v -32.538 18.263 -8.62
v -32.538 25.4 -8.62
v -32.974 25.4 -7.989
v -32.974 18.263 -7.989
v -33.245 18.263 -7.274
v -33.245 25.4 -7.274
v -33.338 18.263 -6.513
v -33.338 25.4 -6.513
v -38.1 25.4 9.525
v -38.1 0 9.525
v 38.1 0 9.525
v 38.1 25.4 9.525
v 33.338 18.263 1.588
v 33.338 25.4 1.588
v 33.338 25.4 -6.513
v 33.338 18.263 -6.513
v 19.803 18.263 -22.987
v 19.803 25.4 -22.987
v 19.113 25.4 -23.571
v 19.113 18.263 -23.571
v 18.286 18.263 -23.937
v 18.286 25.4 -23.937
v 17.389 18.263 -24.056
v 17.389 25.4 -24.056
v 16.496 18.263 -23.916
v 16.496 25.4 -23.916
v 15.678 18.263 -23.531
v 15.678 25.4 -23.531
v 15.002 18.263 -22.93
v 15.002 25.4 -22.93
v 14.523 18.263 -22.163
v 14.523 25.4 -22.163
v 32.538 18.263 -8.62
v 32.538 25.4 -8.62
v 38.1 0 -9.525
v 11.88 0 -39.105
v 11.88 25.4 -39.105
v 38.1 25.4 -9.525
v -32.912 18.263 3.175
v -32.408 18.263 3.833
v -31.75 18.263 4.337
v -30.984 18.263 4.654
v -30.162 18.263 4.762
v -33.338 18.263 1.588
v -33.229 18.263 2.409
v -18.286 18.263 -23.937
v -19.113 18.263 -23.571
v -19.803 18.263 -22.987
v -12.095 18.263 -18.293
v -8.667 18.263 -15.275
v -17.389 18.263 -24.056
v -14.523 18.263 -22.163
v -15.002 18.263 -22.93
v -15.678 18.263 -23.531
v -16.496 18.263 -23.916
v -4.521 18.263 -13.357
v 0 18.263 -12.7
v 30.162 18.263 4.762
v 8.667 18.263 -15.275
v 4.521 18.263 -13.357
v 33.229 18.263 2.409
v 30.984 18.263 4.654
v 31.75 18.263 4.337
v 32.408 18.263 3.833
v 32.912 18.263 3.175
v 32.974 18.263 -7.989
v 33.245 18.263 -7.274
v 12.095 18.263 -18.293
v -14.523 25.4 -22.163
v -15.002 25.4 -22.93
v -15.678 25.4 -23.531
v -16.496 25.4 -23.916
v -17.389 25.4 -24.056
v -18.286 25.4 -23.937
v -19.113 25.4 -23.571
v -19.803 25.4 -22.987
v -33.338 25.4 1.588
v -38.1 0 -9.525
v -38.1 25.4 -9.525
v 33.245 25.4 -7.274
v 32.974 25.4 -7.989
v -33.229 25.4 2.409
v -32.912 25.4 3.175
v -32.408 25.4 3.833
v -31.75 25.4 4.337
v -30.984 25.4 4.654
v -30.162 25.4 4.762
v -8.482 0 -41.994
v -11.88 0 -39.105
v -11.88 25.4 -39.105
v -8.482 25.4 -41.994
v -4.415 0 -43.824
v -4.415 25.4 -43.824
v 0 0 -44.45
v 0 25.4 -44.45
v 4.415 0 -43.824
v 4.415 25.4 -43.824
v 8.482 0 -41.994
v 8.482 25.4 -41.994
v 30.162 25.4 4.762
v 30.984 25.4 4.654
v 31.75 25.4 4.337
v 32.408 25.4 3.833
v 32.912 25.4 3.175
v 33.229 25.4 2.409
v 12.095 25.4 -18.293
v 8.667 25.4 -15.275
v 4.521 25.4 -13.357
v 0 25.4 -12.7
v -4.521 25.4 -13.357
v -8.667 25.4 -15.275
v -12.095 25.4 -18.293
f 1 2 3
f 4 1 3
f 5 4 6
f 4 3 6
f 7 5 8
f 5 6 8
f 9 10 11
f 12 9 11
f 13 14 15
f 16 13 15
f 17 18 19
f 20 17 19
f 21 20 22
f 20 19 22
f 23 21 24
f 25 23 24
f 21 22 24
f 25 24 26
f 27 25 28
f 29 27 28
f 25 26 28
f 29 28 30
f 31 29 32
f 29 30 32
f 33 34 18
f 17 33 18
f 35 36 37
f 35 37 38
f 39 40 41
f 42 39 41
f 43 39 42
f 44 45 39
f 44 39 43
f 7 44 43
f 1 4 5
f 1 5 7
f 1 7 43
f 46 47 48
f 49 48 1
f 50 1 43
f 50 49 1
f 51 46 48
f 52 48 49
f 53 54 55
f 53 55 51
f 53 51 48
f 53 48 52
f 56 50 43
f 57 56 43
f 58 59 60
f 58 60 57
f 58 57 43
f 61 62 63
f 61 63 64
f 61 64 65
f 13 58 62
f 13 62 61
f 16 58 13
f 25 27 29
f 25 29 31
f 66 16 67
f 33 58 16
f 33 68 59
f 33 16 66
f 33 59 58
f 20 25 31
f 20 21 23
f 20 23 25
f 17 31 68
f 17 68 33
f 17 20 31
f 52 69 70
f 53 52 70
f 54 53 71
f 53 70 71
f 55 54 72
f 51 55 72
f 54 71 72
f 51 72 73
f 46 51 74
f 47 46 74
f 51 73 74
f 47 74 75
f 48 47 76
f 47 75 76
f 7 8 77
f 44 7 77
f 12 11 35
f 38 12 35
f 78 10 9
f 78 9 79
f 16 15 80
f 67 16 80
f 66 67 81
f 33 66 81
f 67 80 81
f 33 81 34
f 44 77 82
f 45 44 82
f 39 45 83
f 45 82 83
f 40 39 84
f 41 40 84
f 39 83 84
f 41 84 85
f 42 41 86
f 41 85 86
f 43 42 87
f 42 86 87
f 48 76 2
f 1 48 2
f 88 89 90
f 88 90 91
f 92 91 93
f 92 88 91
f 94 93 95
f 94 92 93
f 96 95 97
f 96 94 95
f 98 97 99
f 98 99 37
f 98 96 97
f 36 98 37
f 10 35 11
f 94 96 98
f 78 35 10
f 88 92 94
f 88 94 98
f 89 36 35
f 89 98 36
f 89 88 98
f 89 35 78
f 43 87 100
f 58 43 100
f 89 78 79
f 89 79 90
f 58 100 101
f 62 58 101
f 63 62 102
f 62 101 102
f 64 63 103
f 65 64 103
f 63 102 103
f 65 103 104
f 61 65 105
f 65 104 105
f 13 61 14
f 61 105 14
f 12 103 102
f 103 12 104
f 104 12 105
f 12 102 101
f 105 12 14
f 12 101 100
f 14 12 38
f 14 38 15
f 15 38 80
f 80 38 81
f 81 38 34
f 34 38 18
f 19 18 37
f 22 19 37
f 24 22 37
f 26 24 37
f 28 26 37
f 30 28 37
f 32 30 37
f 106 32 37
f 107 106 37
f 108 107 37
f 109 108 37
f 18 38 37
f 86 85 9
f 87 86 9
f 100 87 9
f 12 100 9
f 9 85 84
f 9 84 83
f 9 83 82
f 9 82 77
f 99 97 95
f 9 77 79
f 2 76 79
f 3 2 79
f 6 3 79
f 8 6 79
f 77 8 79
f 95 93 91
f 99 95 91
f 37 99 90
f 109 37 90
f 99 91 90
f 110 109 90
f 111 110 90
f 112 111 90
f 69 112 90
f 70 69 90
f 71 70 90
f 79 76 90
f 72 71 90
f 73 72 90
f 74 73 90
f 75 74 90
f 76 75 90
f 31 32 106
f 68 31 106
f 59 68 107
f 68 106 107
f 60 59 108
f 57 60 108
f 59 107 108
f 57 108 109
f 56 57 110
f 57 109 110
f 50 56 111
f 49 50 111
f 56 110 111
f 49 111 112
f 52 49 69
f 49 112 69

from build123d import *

# Parameters (mm, degrees)
SKETCH1_W           = 76.2
SKETCH1_H           = 19.05
BOSS_EXTRUDE1_DEPTH = 25.4
BOSS_EXTRUDE2_DEPTH = 25.4
CUT_EXTRUDE1_DEPTH  = 7.1374


with BuildPart() as part:
    # Sketch1 → Boss-Extrude1 (new body)
    with BuildSketch(Plane(origin=(0, 0, 0), x_dir=(1, 0, 0), z_dir=(0, 1, 0))):
        Rectangle(SKETCH1_W, SKETCH1_H)
    extrude(amount=BOSS_EXTRUDE1_DEPTH)

    # Sketch2 → Boss-Extrude2 (add)
    with BuildSketch(Plane(origin=(0, 0, 0), x_dir=(1, 0, 0), z_dir=(0, 1, 0))):
        with BuildLine():
            Line((-38.1, 9.525), (-11.879738537, 39.105310408))
            ThreePointArc((-11.879738537, 39.105310408), (0, 44.45), (11.879738537, 39.105310408))
            Line((11.879738537, 39.105310408), (38.1, 9.525))
            Line((38.1, 9.525), (38.1, -9.525))
            Line((38.1, -9.525), (-38.1, -9.525))
            Line((-38.1, -9.525), (-38.1, 9.525))
        make_face()
    extrude(amount=BOSS_EXTRUDE2_DEPTH)

    # Sketch3 → Cut-Extrude1 (cut)
    with BuildSketch(Plane(origin=(0, 25.4, 0), x_dir=(1, 0, 0), z_dir=(0, 1, 0))):
        with BuildLine():
            Line((-30.1625, -4.7625), (30.1625, -4.7625))
            ThreePointArc((30.1625, -4.7625), (32.40756403, -3.83256403), (33.3375, -1.5875))
            Line((33.3375, -1.5875), (33.3375, 6.513465997))
            ThreePointArc((33.3375, 6.513465997), (33.131023115, 7.639741058), (32.538447707, 8.619528078))
            Line((32.538447707, 8.619528078), (19.803029448, 22.986952515))
            ThreePointArc((19.803029448, 22.986952515), (16.937724791, 24.017951921), (14.522568117, 22.163242028))
            ThreePointArc((14.522568117, 22.163242028), (0, 12.7), (-14.522568117, 22.163242028))
            ThreePointArc((-14.522568117, 22.163242028), (-16.937724791, 24.017951921), (-19.803029448, 22.986952515))
            Line((-19.803029448, 22.986952515), (-32.538447707, 8.619528078))
            ThreePointArc((-32.538447707, 8.619528078), (-33.131023115, 7.639741058), (-33.3375, 6.513465997))
            Line((-33.3375, 6.513465997), (-33.3375, -1.5875))
            ThreePointArc((-33.3375, -1.5875), (-32.40756403, -3.83256403), (-30.1625, -4.7625))
        make_face()
    extrude(amount=-CUT_EXTRUDE1_DEPTH, mode=Mode.SUBTRACT)


solid = part.part
